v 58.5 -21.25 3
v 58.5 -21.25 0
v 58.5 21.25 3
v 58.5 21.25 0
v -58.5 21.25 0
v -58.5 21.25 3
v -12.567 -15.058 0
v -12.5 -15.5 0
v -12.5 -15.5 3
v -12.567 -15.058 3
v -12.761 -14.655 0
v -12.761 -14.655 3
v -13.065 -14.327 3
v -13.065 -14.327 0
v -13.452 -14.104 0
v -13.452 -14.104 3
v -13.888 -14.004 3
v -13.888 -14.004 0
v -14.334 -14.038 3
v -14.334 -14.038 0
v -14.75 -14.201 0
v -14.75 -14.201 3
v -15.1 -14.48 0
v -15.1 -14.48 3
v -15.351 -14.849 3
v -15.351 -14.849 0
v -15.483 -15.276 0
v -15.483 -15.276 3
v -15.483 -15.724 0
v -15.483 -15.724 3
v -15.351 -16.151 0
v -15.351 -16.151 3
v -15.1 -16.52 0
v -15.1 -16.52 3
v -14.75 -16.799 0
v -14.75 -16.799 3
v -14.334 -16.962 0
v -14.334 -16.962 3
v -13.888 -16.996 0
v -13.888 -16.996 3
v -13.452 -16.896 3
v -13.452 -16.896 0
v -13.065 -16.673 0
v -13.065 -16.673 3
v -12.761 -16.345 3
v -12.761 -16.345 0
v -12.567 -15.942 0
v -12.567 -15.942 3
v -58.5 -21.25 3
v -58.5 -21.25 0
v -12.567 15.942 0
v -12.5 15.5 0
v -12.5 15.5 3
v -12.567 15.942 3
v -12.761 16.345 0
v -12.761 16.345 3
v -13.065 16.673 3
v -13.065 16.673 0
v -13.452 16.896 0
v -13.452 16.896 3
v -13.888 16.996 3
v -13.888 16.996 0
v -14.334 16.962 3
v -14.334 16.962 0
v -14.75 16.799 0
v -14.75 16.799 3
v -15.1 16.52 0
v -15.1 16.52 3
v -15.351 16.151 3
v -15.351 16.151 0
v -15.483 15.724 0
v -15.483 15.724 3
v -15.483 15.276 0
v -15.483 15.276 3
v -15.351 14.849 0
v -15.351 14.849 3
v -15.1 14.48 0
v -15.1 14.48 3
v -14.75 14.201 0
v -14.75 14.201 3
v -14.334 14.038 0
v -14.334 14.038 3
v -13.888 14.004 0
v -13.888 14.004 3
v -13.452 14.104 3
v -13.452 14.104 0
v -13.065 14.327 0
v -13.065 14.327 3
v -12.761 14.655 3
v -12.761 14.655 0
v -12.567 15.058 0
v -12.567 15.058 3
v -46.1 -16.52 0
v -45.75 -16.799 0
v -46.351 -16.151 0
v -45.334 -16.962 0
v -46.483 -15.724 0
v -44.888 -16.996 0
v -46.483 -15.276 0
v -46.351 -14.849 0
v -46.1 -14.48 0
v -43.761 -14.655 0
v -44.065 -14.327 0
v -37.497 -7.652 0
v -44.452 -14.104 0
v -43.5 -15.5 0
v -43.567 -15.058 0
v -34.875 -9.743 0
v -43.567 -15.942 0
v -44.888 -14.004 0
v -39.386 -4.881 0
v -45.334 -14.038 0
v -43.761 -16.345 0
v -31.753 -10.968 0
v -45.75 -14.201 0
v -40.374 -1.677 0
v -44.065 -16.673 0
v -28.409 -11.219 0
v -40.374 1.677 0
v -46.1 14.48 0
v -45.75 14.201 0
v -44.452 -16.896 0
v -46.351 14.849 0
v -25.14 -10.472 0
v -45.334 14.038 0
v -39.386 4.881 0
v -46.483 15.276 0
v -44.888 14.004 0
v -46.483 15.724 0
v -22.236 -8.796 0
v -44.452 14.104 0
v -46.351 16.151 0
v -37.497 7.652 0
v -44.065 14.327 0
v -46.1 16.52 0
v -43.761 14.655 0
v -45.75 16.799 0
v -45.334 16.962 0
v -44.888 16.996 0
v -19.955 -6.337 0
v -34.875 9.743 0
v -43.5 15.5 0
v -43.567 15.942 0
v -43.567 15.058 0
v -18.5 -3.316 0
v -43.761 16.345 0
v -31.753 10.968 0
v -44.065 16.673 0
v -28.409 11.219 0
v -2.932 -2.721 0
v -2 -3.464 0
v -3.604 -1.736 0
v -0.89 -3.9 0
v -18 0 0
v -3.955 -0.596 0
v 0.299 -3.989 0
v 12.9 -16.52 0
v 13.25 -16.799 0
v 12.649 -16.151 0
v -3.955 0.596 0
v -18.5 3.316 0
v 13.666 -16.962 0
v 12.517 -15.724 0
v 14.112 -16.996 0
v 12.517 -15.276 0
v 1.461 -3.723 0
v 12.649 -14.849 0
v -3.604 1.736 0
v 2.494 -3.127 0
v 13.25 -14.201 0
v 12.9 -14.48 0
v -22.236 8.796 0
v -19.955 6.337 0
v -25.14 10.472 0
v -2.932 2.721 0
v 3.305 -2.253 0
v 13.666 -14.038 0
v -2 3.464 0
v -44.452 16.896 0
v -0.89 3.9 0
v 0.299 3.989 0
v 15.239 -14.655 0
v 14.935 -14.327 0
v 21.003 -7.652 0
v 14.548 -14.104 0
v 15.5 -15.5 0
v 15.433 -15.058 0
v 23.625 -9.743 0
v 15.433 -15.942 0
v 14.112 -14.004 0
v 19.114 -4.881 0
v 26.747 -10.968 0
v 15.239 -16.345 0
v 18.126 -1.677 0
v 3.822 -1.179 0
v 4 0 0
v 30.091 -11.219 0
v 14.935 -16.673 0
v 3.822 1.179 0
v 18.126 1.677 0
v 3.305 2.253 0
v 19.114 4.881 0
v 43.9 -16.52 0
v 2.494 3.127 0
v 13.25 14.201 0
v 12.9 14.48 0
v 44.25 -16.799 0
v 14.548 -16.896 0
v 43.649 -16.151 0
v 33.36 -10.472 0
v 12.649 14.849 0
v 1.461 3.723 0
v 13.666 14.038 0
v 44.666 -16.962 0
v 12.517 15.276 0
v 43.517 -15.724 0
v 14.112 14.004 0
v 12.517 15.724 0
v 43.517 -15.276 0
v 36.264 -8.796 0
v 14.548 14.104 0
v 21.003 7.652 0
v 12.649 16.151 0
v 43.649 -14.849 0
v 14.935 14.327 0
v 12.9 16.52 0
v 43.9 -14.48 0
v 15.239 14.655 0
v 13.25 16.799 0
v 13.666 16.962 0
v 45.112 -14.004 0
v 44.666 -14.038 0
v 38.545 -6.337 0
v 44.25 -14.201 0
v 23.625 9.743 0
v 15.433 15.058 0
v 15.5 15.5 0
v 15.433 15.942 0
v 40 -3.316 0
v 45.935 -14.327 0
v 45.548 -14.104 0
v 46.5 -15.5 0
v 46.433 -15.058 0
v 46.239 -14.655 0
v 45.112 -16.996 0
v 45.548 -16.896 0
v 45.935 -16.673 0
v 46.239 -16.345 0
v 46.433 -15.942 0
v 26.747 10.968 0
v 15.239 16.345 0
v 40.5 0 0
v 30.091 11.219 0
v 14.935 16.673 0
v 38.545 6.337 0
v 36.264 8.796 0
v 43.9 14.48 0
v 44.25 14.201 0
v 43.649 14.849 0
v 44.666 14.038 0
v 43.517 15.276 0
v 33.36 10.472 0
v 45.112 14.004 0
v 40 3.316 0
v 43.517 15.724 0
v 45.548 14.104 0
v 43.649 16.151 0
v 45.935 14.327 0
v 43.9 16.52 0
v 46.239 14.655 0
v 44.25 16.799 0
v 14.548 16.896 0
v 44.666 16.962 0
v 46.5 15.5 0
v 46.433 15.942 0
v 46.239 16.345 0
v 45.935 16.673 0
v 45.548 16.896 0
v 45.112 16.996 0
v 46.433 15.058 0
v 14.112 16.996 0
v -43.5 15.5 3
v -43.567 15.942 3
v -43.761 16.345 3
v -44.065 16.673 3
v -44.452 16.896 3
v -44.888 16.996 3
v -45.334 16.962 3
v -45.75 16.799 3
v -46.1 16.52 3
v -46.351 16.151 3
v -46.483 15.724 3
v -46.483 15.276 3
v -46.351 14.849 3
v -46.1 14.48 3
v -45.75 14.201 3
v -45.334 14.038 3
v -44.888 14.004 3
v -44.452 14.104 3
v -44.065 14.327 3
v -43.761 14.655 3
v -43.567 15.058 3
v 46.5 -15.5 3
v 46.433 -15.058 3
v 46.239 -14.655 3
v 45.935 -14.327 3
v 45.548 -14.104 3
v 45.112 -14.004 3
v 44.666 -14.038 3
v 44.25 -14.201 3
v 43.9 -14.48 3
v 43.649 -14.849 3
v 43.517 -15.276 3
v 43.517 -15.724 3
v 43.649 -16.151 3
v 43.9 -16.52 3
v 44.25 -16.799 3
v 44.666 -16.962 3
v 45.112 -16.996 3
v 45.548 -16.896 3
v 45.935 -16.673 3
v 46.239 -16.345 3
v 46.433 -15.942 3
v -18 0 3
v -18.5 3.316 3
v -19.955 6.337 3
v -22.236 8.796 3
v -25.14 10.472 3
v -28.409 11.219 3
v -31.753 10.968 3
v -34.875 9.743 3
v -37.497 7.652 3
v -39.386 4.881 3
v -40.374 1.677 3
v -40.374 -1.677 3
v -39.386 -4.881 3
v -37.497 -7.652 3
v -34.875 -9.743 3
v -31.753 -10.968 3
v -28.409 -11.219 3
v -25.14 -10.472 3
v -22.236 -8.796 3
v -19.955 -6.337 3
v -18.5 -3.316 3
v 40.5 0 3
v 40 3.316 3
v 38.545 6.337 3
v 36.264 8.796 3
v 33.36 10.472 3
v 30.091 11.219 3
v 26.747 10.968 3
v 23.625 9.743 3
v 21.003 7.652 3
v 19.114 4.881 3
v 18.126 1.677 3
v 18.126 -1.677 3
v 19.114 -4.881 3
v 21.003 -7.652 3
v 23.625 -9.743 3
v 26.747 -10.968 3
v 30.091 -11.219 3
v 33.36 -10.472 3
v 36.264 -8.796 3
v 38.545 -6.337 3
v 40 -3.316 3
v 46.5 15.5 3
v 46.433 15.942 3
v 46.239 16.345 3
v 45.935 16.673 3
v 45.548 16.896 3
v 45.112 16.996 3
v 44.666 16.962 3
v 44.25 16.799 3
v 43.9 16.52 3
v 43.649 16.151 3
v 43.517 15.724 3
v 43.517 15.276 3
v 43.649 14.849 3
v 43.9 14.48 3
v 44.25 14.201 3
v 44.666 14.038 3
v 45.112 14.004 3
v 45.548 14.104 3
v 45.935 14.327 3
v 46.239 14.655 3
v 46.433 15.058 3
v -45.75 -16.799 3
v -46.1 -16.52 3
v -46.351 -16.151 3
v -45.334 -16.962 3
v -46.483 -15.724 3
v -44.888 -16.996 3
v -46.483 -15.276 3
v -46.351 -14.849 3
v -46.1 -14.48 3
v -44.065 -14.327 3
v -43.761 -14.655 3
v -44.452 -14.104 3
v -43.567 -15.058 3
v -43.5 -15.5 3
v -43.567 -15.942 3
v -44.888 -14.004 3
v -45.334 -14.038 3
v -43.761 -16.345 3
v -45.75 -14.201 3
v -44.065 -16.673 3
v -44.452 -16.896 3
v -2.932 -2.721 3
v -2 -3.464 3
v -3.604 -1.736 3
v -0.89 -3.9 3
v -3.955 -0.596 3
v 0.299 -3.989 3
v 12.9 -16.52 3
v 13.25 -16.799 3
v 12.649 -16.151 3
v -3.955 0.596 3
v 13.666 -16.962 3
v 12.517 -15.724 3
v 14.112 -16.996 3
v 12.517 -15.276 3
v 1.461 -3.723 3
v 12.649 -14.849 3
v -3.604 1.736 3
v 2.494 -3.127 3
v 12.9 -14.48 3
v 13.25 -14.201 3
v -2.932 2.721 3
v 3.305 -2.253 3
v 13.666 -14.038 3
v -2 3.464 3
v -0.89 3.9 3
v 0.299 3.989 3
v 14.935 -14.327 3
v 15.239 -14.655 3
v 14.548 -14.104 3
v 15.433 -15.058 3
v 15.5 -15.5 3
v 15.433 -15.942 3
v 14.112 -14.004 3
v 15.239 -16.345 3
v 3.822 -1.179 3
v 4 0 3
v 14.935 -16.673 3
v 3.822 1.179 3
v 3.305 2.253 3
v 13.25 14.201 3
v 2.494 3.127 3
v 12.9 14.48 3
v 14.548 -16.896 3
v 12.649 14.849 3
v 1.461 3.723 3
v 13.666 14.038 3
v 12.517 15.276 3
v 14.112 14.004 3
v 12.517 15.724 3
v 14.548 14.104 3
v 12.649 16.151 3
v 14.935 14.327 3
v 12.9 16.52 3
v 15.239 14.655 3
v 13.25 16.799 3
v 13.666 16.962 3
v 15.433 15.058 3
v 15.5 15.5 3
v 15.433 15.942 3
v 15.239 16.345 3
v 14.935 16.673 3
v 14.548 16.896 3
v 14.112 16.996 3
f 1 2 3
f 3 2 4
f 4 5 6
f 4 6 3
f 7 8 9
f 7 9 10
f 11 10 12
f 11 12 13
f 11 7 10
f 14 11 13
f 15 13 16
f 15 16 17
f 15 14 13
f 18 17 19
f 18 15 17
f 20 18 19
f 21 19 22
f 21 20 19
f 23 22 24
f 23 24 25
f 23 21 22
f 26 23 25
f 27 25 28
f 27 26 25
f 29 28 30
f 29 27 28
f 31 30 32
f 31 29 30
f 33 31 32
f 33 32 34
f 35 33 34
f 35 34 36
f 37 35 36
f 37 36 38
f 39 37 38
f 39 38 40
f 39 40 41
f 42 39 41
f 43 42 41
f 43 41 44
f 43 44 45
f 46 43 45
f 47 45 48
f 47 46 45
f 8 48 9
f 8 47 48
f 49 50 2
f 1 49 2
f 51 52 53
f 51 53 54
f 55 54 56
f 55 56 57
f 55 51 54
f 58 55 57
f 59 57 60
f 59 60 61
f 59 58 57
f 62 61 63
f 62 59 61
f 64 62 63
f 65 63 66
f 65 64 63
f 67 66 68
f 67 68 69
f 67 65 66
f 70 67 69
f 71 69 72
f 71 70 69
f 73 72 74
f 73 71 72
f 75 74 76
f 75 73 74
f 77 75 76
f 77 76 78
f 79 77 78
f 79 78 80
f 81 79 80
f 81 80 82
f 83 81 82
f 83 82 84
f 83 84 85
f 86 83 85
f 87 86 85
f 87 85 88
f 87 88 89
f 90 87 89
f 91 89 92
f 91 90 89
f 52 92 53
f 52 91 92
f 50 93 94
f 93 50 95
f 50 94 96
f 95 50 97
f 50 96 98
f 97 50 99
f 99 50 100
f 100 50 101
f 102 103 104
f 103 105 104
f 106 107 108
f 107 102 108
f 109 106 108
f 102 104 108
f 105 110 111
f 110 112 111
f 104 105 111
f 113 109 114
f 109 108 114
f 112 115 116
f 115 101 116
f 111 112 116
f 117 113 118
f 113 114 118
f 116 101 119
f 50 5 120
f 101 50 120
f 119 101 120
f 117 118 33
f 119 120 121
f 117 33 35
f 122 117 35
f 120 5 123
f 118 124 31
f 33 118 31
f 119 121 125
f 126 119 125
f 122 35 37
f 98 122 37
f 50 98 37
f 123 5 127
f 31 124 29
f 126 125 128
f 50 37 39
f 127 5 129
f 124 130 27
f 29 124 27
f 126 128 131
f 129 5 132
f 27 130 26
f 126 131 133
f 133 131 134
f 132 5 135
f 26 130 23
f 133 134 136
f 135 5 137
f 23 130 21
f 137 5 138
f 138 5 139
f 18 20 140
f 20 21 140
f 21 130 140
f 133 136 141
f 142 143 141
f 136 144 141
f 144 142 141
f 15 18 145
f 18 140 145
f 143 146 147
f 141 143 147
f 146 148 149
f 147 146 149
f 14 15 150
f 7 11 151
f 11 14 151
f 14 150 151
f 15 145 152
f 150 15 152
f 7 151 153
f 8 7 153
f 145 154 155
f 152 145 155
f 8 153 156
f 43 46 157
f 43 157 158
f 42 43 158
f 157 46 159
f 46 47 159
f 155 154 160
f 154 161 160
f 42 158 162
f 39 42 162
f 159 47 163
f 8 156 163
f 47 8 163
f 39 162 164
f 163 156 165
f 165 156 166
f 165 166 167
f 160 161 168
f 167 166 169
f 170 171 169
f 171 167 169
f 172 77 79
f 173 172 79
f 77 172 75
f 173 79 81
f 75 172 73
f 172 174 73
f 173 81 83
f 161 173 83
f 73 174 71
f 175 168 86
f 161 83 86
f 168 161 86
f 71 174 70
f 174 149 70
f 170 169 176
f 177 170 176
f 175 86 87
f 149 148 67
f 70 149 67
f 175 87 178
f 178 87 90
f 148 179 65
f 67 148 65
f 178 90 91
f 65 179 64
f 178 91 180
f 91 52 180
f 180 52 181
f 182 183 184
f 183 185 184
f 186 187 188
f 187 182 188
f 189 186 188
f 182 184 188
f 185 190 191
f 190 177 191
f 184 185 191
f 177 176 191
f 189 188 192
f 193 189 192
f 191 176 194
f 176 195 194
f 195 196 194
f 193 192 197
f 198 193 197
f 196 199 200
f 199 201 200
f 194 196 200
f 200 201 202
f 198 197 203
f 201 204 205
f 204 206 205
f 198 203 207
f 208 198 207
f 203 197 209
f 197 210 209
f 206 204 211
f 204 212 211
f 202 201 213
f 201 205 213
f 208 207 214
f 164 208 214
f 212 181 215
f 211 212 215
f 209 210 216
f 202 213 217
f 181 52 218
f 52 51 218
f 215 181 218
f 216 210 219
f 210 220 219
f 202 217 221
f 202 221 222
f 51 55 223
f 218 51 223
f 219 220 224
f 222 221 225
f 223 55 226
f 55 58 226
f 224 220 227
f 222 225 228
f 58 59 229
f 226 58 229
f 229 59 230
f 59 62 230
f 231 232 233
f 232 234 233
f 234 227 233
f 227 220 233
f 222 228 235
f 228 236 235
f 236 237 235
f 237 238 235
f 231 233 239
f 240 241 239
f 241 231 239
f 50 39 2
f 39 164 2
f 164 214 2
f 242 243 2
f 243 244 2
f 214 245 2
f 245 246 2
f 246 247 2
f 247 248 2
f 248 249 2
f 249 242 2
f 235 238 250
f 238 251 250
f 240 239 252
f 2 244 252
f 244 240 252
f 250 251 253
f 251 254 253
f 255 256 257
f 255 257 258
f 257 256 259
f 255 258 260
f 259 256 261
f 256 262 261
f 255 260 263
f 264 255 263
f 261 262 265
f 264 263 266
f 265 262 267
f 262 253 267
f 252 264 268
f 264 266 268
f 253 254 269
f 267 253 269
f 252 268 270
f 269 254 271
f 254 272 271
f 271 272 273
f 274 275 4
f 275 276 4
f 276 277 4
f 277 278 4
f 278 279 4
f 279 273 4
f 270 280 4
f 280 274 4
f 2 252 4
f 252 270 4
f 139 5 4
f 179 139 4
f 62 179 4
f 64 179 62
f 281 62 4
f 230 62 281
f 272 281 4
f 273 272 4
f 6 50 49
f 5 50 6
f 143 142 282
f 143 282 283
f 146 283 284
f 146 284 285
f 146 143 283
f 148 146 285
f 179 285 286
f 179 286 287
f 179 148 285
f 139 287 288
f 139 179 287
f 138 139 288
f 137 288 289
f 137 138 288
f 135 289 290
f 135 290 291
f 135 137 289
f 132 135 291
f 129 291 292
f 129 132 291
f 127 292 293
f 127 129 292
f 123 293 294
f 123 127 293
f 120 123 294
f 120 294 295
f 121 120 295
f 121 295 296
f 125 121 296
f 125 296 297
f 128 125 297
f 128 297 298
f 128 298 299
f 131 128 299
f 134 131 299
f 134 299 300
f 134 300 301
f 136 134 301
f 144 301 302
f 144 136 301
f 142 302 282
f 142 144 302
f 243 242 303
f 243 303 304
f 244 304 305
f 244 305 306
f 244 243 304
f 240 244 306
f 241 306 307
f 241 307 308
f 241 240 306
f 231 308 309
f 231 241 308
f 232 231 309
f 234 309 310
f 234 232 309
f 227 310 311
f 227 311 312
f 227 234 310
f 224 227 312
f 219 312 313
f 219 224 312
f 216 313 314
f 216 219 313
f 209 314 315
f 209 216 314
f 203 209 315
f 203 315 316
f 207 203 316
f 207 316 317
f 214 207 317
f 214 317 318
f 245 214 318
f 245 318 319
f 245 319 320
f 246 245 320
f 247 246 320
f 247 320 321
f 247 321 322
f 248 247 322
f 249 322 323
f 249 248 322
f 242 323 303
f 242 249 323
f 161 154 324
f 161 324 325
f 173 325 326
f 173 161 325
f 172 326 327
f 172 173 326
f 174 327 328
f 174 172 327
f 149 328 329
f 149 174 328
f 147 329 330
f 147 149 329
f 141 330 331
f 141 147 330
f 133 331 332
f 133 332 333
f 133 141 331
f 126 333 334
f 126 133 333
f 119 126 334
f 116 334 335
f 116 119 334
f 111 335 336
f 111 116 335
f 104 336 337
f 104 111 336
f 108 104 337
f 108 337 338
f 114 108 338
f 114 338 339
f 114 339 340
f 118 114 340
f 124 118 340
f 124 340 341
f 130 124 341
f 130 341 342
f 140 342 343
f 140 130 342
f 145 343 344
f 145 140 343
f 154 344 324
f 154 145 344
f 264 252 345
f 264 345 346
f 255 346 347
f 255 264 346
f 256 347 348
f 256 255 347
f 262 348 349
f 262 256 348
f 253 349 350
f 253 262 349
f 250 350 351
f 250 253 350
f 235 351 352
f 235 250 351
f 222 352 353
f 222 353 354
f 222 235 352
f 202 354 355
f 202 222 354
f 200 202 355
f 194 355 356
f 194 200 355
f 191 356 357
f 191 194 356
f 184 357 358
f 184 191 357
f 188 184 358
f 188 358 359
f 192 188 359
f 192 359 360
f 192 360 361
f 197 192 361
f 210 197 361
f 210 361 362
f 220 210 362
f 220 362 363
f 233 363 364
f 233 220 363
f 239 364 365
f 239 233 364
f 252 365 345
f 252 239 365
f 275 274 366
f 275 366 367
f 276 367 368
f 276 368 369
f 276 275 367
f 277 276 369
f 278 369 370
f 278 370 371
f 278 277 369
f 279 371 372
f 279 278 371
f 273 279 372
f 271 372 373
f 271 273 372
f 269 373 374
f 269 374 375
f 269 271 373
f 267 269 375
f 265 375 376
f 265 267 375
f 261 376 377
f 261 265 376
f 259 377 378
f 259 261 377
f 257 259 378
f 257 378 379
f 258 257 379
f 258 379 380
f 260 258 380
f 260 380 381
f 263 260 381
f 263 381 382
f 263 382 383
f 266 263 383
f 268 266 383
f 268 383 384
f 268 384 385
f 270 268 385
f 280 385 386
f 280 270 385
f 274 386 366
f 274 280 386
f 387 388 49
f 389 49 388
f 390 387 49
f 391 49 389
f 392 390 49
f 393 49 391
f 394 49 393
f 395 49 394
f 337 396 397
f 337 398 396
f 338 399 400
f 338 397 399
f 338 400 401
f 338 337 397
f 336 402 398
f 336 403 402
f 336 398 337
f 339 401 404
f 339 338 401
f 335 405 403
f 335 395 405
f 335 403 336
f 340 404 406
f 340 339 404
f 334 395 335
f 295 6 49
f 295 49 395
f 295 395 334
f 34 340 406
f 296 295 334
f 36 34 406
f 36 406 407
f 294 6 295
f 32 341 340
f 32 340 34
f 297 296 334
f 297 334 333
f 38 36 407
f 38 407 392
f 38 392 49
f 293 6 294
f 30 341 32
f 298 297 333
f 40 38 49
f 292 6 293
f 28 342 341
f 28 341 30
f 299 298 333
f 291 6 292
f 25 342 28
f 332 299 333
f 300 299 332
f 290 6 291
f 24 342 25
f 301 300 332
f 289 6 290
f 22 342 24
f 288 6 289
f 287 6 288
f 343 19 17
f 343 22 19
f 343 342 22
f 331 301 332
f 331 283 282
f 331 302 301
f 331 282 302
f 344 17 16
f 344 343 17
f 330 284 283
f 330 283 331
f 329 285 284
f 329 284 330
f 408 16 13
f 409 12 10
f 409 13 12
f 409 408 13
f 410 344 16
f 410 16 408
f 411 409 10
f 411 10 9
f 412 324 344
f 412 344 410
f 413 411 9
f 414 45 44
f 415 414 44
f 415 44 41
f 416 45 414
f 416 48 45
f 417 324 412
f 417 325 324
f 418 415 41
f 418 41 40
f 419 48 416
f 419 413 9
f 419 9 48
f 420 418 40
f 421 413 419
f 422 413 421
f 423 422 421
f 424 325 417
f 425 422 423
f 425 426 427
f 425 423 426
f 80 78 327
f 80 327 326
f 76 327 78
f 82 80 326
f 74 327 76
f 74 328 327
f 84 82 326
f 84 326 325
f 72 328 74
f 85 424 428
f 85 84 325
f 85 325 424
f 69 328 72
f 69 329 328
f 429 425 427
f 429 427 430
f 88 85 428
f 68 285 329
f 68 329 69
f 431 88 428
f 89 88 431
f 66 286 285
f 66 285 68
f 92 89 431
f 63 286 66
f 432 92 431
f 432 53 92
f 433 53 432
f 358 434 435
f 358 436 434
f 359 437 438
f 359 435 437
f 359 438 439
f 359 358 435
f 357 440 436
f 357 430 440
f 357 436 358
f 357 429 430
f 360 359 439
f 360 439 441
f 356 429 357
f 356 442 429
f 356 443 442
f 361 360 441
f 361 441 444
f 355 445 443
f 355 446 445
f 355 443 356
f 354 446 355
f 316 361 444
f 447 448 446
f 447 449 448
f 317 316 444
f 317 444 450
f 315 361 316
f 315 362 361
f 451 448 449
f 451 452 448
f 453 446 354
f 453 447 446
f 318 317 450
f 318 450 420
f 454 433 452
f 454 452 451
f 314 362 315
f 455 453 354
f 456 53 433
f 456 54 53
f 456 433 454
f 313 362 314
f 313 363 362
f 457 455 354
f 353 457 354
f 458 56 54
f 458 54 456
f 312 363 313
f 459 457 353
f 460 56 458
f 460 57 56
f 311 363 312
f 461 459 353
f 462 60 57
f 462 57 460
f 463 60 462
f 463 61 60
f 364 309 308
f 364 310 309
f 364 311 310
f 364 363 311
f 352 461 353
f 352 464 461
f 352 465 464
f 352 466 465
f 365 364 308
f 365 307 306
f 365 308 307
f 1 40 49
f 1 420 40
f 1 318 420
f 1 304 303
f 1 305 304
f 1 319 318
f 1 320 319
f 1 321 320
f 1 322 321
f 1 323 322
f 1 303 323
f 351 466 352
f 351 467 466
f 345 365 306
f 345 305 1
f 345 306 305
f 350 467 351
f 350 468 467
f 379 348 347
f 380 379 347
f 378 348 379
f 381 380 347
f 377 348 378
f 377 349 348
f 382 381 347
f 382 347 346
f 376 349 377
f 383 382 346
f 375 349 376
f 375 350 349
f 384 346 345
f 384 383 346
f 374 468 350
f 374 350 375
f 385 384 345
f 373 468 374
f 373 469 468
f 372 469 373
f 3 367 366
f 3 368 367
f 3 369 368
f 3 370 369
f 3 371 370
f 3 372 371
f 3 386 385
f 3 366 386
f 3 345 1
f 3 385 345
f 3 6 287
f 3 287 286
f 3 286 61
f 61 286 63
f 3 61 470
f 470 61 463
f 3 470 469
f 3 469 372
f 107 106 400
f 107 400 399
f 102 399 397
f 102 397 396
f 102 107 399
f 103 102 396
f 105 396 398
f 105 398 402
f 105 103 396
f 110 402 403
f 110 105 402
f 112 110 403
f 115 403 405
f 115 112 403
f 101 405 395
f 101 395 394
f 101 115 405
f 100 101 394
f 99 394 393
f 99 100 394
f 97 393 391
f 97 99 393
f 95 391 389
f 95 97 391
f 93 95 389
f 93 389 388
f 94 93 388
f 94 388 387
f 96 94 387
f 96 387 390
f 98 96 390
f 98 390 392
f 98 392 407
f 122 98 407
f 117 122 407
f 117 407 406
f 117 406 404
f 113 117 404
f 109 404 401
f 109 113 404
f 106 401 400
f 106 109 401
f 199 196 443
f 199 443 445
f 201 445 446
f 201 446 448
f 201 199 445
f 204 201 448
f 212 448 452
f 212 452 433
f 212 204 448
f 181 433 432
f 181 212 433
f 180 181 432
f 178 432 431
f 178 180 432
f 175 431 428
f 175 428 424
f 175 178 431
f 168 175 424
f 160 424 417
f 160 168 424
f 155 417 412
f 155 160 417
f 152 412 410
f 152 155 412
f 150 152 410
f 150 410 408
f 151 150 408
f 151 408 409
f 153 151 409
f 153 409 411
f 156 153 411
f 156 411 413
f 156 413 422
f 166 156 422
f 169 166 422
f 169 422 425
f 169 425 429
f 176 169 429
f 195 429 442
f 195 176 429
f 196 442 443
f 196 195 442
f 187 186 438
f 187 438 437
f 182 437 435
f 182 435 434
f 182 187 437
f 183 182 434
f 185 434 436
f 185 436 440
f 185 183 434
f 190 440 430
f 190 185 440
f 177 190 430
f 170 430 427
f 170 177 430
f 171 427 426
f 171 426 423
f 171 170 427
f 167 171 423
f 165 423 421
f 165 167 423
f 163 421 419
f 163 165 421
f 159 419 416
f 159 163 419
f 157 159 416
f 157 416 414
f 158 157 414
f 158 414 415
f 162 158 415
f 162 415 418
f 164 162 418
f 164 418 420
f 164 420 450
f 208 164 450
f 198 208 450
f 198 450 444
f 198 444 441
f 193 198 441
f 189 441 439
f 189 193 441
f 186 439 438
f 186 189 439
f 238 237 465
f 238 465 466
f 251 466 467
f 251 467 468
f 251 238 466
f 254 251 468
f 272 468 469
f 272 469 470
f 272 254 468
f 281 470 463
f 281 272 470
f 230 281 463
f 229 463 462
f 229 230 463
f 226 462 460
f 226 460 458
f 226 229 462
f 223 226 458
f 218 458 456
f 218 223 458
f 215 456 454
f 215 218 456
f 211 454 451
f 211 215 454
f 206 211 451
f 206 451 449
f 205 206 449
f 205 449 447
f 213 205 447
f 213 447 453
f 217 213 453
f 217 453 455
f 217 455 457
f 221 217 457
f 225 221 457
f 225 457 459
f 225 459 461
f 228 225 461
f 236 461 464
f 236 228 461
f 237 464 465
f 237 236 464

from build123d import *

# Parameters (mm, degrees)
SKETCH_W   = 117
SKETCH_H   = 42.5
SKETCH_R   = 11.25
SKETCH_R_2 = 4
SKETCH_R_3 = 1.5
PAD_DEPTH  = 3


with BuildPart() as part:
    # Sketch → Pad (new body)
    with BuildSketch(Plane.XY):
        Rectangle(SKETCH_W, SKETCH_H)
        with Locations((-29.25, 0)):
            Circle(SKETCH_R, mode=Mode.SUBTRACT)
        with Locations((29.25, 0)):
            Circle(SKETCH_R, mode=Mode.SUBTRACT)
        Circle(SKETCH_R_2, mode=Mode.SUBTRACT)
        with Locations((-45, 15.5)):
            Circle(SKETCH_R_3, mode=Mode.SUBTRACT)
        with Locations((-14, 15.5)):
            Circle(SKETCH_R_3, mode=Mode.SUBTRACT)
        with Locations((-14, -15.5)):
            Circle(SKETCH_R_3, mode=Mode.SUBTRACT)
        with Locations((-45, -15.5)):
            Circle(SKETCH_R_3, mode=Mode.SUBTRACT)
        with Locations((14, 15.5)):
            Circle(SKETCH_R_3, mode=Mode.SUBTRACT)
        with Locations((45, 15.5)):
            Circle(SKETCH_R_3, mode=Mode.SUBTRACT)
        with Locations((45, -15.5)):
            Circle(SKETCH_R_3, mode=Mode.SUBTRACT)
        with Locations((14, -15.5)):
            Circle(SKETCH_R_3, mode=Mode.SUBTRACT)
    extrude(amount=PAD_DEPTH)


solid = part.part
